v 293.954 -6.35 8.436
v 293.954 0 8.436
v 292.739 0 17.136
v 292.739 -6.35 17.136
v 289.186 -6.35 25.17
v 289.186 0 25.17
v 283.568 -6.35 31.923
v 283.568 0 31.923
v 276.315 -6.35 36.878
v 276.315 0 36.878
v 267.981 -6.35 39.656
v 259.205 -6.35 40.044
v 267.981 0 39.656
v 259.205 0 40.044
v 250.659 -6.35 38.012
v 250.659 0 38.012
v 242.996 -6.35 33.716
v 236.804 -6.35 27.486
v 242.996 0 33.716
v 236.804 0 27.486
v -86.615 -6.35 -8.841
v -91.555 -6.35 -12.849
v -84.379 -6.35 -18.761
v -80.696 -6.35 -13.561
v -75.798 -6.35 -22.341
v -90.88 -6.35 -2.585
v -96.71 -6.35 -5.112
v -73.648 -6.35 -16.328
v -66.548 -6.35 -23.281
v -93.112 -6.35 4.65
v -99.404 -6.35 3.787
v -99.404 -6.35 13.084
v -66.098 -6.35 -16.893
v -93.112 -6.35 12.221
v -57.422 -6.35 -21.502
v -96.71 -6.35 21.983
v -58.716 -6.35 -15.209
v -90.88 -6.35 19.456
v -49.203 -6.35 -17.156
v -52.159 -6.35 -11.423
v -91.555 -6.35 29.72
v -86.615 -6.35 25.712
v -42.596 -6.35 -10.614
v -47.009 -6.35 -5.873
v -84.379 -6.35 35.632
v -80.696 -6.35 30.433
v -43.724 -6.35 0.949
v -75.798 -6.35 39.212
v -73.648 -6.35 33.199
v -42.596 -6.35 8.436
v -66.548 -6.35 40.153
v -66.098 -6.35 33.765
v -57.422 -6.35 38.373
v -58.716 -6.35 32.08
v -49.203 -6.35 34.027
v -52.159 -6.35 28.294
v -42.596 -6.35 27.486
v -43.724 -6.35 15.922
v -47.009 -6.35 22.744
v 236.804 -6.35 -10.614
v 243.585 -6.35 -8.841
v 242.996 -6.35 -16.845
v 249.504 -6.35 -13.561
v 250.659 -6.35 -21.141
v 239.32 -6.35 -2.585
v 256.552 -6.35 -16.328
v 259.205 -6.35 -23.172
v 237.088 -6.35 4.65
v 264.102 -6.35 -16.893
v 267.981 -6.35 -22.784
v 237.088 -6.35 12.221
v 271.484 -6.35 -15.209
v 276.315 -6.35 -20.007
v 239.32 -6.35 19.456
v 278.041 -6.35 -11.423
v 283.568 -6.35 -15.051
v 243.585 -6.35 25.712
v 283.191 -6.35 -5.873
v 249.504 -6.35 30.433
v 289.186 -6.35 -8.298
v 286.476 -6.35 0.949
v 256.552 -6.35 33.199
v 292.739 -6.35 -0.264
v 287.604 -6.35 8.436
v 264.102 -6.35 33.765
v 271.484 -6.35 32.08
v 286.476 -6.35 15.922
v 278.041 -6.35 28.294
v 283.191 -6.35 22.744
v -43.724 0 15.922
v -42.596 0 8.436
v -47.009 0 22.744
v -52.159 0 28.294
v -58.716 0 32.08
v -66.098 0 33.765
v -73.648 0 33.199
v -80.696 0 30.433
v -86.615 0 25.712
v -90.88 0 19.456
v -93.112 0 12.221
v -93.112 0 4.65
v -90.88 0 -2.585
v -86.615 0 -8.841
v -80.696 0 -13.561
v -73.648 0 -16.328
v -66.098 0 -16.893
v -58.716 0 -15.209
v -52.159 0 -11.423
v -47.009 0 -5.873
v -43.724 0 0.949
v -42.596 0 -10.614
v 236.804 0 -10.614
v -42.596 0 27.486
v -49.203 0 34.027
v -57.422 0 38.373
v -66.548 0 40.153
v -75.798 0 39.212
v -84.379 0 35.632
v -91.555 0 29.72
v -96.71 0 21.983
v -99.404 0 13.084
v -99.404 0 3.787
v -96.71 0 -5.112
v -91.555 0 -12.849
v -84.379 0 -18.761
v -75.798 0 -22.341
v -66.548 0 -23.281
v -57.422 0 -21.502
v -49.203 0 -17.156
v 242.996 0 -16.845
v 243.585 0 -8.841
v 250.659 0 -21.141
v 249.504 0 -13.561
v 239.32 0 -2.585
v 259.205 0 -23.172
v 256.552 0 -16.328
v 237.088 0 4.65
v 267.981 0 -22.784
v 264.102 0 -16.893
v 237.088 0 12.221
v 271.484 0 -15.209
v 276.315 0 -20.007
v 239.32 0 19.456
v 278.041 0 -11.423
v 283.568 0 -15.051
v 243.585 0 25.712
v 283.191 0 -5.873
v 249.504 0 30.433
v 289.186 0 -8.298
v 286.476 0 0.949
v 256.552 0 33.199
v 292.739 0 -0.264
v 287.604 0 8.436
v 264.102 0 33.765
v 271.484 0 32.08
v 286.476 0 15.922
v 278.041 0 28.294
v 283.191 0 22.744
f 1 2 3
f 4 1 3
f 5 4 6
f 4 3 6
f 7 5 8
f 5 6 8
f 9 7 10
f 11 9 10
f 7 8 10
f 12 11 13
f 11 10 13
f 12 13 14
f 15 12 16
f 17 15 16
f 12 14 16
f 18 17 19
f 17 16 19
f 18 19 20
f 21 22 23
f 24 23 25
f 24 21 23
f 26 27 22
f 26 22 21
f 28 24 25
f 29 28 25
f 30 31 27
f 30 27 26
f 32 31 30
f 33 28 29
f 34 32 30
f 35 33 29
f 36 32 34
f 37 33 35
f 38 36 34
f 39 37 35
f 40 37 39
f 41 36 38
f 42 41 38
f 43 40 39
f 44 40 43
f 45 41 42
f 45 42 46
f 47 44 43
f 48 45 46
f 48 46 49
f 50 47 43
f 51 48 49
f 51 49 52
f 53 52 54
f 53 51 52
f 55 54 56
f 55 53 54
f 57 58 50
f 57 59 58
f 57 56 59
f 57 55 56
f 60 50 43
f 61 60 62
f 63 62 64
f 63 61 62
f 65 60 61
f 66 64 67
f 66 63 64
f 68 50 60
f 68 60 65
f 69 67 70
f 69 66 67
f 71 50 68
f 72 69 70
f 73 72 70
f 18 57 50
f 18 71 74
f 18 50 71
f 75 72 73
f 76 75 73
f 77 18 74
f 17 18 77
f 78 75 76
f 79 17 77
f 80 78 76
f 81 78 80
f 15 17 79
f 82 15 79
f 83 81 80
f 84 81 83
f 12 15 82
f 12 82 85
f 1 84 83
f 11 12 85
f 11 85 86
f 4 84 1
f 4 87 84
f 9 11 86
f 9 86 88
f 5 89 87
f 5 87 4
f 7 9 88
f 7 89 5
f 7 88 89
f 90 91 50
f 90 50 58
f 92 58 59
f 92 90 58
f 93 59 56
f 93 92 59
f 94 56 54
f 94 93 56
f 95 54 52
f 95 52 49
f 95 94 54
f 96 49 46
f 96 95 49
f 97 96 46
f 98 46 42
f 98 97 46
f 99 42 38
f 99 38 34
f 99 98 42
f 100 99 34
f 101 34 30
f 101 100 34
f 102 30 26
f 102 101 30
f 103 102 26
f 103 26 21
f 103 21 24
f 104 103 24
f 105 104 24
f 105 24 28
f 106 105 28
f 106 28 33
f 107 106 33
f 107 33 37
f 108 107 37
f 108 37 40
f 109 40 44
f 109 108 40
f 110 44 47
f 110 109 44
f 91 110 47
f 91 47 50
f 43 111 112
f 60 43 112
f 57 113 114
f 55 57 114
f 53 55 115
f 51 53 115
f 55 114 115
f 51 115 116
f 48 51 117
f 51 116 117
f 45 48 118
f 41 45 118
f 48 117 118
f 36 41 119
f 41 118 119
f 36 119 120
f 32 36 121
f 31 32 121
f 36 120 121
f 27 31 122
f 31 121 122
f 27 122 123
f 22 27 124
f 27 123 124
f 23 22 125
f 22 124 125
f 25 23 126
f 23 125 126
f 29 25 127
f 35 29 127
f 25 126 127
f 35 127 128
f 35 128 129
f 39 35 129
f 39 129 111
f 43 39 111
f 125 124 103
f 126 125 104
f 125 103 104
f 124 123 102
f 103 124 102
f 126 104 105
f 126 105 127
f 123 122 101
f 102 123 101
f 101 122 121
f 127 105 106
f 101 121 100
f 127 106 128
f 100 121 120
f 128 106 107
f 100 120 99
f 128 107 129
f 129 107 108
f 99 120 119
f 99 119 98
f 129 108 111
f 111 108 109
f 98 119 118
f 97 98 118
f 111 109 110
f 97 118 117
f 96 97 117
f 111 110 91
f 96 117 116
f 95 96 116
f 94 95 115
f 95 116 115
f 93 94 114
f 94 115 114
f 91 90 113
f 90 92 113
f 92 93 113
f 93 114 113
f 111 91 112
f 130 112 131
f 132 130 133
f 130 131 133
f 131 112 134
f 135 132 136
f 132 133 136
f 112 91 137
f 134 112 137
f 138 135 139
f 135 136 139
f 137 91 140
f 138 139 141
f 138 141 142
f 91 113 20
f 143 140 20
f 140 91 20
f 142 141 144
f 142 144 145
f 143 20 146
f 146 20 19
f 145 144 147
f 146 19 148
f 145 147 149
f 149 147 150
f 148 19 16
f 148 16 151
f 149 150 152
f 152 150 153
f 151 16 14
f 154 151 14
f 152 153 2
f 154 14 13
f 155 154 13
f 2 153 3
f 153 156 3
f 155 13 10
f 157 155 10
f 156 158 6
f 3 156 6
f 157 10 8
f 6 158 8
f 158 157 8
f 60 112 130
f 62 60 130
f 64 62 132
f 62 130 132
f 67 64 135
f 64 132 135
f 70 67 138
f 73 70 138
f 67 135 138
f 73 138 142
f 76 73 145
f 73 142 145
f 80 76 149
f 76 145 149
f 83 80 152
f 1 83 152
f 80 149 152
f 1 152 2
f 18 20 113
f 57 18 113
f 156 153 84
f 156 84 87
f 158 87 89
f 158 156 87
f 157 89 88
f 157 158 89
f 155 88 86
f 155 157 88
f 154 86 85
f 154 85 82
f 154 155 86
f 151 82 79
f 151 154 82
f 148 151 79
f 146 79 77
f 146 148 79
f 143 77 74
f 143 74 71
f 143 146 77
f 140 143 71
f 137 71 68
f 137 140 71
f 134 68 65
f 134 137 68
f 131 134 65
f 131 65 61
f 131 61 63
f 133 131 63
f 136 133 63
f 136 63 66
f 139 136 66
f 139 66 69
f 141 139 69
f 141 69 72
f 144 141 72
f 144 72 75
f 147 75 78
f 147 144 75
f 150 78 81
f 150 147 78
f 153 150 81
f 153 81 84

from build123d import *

# Parameters (mm, degrees)
F0_R     = 25.4
F1_DEPTH = 6.35


with BuildPart() as f1:
    # F0 (on Front) → F1 (new body)
    with BuildSketch(Plane.XZ):
        with BuildLine():
            ThreePointArc((-42.59572, -10.614441), (-37.875025, -1.604672), (-36.24572, 8.435559))
            ThreePointArc((-36.24572, 8.435559), (-37.875025, 18.475791), (-42.59572, 27.485559))
            ThreePointArc((-42.59572, 27.485559), (-99.74572, 8.435559), (-42.59572, -10.614441))
        make_face()
        with Locations((-67.99572, 8.435559)):
            Circle(F0_R, mode=Mode.SUBTRACT)
        with BuildLine():
            ThreePointArc((-42.59572, 27.485559), (-37.875025, 18.475791), (-36.24572, 8.435559))
            ThreePointArc((-36.24572, 8.435559), (-37.875025, -1.604672), (-42.59572, -10.614441))
            Line((-42.59572, -10.614441), (236.80428, -10.614441))
            ThreePointArc((236.80428, -10.614441), (230.45428, 8.435559), (236.80428, 27.485559))
            Line((236.80428, 27.485559), (97.10428, 27.485559))
            Line((97.10428, 27.485559), (-42.59572, 27.485559))
        make_face()
        with BuildLine():
            ThreePointArc((236.80428, 27.485559), (230.45428, 8.435559), (236.80428, -10.614441))
            ThreePointArc((236.80428, -10.614441), (272.244512, -21.685135), (293.95428, 8.435559))
            ThreePointArc((293.95428, 8.435559), (272.244512, 38.556254), (236.80428, 27.485559))
        make_face()
        with Locations((262.20428, 8.435559)):
            Circle(F0_R, mode=Mode.SUBTRACT)
    extrude(amount=F1_DEPTH)


solid = f1.part
